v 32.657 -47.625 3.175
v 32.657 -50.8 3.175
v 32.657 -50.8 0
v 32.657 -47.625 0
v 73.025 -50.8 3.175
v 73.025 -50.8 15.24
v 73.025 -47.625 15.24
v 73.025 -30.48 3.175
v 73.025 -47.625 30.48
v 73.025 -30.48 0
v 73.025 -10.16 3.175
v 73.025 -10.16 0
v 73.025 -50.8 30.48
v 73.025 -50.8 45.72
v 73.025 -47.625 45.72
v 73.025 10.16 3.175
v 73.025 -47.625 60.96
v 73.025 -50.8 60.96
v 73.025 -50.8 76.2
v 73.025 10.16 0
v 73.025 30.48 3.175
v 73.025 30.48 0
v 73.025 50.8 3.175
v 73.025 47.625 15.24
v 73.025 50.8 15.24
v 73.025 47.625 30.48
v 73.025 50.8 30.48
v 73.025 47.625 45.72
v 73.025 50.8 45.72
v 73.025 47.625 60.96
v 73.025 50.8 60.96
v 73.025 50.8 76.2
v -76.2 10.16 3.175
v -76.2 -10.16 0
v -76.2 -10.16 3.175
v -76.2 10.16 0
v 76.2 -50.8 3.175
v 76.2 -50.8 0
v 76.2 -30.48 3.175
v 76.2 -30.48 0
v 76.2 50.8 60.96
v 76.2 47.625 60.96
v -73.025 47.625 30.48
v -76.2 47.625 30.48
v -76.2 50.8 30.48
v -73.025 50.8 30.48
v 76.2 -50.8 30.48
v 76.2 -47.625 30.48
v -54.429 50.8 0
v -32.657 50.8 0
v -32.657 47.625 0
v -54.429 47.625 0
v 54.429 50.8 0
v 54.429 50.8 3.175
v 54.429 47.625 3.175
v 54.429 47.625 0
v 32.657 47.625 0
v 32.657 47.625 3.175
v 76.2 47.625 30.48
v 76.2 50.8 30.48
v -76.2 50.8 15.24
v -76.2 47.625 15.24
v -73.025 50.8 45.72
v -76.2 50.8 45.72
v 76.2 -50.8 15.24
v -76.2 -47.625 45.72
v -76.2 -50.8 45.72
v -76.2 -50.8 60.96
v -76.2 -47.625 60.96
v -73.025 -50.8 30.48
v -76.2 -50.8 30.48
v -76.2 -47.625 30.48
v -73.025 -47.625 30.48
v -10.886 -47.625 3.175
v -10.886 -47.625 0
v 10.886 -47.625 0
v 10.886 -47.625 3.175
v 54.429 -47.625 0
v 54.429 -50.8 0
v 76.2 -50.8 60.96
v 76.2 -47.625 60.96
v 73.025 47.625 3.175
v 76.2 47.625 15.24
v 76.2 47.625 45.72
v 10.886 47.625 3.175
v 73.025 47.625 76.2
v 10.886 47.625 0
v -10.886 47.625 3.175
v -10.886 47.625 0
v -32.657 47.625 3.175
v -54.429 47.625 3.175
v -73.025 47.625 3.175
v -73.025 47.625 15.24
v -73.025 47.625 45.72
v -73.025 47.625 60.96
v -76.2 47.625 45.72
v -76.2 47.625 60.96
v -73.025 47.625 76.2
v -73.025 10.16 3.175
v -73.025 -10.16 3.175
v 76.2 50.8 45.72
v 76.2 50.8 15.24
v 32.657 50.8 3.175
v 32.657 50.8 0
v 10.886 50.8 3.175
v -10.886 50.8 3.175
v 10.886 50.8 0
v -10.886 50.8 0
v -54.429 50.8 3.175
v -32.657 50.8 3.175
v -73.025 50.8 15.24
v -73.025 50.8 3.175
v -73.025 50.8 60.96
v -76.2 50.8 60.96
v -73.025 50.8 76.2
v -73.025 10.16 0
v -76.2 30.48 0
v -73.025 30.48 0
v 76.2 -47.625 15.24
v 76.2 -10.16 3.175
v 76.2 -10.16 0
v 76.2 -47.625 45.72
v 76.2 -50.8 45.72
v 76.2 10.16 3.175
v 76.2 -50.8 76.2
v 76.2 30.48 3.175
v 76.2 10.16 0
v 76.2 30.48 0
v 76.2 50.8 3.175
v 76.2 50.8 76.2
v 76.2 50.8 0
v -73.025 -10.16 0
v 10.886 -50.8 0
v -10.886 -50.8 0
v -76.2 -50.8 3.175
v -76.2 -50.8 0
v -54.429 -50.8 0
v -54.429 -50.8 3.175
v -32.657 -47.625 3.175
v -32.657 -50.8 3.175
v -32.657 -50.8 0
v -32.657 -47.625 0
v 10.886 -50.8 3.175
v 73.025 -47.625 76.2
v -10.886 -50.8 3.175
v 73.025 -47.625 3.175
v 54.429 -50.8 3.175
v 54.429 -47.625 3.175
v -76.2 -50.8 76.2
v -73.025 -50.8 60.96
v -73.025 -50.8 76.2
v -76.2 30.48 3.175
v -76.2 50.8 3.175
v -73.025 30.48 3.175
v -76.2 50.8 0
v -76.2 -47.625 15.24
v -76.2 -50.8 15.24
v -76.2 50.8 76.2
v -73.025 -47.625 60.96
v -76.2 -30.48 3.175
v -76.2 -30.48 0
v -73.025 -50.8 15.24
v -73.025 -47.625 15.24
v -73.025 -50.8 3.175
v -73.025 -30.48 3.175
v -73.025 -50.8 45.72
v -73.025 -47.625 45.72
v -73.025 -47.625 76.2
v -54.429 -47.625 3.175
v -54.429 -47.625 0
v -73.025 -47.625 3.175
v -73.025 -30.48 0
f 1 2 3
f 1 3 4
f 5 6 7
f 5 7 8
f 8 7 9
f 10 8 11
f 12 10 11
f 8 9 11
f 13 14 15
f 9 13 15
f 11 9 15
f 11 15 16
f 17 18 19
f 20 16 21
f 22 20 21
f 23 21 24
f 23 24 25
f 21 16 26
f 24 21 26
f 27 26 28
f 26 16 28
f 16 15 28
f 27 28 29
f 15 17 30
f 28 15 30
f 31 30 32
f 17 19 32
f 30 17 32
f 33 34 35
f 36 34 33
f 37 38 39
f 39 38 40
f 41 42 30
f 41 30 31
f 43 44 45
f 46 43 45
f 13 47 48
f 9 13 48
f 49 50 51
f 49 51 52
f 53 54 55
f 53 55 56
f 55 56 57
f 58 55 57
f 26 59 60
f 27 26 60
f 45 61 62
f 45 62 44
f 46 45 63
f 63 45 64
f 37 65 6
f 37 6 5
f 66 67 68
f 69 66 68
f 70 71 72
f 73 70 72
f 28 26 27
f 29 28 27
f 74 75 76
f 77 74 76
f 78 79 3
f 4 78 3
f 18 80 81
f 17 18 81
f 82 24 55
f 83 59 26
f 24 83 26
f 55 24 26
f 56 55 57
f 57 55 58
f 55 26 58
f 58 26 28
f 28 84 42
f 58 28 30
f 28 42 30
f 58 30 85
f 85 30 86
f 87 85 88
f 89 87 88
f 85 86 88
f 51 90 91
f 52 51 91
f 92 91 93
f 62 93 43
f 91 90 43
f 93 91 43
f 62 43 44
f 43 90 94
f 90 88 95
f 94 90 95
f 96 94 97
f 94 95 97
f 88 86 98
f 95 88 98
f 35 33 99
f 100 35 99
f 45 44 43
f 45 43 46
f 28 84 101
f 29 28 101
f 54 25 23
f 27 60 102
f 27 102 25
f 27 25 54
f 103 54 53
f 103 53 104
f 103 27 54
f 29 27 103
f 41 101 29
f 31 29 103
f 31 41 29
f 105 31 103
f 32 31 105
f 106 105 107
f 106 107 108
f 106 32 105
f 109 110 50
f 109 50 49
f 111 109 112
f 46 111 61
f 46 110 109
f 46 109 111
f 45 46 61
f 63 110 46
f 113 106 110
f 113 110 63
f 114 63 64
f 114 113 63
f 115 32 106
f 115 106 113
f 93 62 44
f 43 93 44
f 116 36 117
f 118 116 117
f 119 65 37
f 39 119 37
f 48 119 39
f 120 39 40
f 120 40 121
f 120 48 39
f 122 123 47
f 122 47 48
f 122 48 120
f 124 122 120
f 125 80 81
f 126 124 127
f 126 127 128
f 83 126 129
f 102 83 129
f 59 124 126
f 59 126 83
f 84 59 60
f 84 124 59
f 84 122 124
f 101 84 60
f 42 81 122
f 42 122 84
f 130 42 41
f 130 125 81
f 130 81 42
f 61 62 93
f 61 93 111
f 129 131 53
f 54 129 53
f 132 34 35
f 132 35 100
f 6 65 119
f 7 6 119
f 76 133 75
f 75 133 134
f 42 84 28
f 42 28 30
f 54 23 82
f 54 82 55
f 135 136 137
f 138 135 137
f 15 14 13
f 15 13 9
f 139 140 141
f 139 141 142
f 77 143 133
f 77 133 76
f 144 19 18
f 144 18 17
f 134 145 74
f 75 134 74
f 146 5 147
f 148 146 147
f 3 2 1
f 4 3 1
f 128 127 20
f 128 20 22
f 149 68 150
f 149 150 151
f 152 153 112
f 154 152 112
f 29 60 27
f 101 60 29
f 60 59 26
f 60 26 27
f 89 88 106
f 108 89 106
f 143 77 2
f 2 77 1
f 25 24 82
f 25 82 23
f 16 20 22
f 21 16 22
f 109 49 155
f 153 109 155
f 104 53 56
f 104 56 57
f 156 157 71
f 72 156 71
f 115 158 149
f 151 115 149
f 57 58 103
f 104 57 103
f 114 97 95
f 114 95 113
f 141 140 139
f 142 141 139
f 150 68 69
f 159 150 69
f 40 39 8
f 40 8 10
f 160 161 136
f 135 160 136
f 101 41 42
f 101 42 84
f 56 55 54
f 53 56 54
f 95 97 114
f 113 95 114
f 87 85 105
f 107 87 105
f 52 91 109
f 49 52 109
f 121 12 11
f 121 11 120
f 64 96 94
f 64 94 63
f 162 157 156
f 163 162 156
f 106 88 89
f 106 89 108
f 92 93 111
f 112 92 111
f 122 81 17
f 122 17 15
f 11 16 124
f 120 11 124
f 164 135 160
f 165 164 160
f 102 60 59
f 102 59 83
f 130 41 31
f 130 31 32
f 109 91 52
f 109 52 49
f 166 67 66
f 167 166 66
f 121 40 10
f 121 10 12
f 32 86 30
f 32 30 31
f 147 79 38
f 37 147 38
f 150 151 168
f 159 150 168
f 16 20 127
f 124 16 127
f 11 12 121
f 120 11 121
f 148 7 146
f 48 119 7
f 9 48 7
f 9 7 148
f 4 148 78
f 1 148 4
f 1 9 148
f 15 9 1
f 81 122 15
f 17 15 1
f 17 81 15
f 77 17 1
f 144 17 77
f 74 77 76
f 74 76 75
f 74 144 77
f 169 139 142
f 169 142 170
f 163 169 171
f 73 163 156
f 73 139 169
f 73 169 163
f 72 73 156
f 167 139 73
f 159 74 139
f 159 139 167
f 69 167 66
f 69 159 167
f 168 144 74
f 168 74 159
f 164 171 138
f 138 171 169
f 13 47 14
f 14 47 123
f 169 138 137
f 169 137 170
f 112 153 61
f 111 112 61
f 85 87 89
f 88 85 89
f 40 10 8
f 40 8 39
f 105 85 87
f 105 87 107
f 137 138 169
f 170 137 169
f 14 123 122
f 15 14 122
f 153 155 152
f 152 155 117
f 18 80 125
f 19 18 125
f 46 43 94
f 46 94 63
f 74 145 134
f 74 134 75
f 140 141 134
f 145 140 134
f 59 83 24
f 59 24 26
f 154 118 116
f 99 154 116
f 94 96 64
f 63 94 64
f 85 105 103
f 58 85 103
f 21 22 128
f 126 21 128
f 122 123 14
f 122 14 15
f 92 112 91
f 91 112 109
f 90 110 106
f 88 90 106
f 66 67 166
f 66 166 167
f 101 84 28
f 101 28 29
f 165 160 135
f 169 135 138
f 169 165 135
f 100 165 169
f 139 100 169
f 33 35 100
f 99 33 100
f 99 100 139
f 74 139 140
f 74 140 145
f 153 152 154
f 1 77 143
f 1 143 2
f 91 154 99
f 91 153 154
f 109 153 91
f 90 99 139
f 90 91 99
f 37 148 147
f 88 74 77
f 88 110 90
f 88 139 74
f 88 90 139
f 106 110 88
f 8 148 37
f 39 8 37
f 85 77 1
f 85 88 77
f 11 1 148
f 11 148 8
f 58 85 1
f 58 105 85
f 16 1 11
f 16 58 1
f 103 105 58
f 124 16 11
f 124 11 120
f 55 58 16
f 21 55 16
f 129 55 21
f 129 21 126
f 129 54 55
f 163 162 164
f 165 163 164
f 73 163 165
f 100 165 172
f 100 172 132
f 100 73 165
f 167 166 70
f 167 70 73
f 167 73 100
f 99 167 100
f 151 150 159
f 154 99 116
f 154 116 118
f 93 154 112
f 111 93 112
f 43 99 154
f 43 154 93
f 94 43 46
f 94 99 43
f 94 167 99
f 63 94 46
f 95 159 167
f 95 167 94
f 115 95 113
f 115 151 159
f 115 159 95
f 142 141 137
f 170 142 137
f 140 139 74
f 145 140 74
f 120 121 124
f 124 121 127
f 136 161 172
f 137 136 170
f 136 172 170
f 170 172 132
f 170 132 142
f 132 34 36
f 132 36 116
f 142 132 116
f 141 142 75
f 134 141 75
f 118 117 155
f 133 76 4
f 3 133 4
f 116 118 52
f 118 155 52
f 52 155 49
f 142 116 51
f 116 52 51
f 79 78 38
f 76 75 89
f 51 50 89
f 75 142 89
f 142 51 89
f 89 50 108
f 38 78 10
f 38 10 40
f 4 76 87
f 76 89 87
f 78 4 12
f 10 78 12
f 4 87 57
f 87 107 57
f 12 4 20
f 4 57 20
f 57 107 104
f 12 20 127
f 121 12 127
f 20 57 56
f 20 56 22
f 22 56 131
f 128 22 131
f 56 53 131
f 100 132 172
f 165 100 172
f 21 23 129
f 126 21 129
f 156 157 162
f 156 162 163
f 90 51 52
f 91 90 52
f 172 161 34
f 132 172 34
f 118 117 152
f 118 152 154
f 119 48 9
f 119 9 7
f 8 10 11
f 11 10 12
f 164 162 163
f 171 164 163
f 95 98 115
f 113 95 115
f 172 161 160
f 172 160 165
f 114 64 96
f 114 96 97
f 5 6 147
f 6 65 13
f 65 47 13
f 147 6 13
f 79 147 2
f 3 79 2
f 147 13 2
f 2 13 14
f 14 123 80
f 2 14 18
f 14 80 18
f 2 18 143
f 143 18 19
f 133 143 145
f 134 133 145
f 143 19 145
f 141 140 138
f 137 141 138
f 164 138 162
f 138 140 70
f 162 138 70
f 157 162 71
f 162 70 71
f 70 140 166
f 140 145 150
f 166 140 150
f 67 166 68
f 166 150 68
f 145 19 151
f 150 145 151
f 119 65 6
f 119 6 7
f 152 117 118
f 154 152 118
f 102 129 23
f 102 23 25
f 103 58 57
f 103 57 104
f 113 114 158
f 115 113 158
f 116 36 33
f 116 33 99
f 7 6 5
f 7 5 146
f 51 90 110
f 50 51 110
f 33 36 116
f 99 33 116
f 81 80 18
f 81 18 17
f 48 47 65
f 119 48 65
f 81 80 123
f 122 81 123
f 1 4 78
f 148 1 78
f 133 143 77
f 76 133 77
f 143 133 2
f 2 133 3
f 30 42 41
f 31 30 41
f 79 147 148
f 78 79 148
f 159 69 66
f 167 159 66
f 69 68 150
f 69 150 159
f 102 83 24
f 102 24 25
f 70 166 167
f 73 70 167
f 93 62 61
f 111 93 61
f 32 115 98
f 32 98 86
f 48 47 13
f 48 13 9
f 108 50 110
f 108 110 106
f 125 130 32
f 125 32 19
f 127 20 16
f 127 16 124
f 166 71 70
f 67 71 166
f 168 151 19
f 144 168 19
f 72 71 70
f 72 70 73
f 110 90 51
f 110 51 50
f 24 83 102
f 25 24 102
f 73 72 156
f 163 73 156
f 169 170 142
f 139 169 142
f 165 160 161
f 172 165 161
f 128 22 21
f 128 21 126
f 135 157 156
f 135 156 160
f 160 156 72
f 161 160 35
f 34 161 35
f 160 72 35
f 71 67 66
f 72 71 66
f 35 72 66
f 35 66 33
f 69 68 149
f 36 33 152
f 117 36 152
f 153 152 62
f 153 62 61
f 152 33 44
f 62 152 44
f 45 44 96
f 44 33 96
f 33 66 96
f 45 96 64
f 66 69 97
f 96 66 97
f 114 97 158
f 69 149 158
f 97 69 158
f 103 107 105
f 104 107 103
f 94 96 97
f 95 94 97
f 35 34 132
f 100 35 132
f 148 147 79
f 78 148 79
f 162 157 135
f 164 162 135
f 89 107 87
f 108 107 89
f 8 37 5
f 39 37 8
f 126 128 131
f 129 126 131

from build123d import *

# Parameters (mm, degrees)
F0_W     = 3.175
F0_H     = 3.175
F0_W_2   = 18.5964285714
F0_H_2   = 17.145
F0_H_3   = 20.32
F0_W_3   = 21.7714285714
F1_DEPTH = 3.175
F2_W     = 3.175
F2_H     = 15.24
F2_H_2   = 12.065
F2_H_3   = 3.175
F3_DEPTH = 3.175
F7_DEPTH = 3.175


with BuildPart() as f1:
    # F0 (on Top) → F1 (new body)
    with BuildSketch(Plane.XY):
        with Locations((-74.6125, 49.2125)):
            Rectangle(F0_W, F0_H)
        with Locations((-63.7267857143, 49.2125)):
            Rectangle(F0_W_2, F0_H)
        with Locations((-74.6125, 39.0525)):
            Rectangle(F0_W, F0_H_2)
        Polygon((73.025, 30.48), (73.025, 47.625), (54.4285714286, 47.625), (32.6571428571, 47.625), (10.8857142857, 47.625), (-10.8857142857, 47.625), (-32.6571428571, 47.625), (-54.4285714286, 47.625), (-73.025, 47.625), (-73.025, 30.48), (-73.025, 10.16), (-73.025, -10.16), (-73.025, -30.48), (-73.025, -47.625), (-54.4285714286, -47.625), (-32.6571428571, -47.625), (-10.8857142857, -47.625), (10.8857142857, -47.625), (32.6571428571, -47.625), (54.4285714286, -47.625), (73.025, -47.625), (73.025, -30.48), (73.025, -10.16), (73.025, 10.16), align=None)
        with Locations((-74.6125, 0)):
            Rectangle(F0_W, F0_H_3)
        with Locations((-74.6125, -39.0525)):
            Rectangle(F0_W, F0_H_2)
        with Locations((-74.6125, -49.2125)):
            Rectangle(F0_W, F0_H)
        with Locations((-63.7267857143, -49.2125)):
            Rectangle(F0_W_2, F0_H)
        with Locations((-21.7714285714, -49.2125)):
            Rectangle(F0_W_3, F0_H)
        with Locations((21.7714285714, -49.2125)):
            Rectangle(F0_W_3, F0_H)
        with Locations((63.7267857143, -49.2125)):
            Rectangle(F0_W_2, F0_H)
        with Locations((74.6125, -49.2125)):
            Rectangle(F0_W, F0_H)
        with Locations((74.6125, -39.0525)):
            Rectangle(F0_W, F0_H_2)
        with Locations((74.6125, 0)):
            Rectangle(F0_W, F0_H_3)
        with Locations((74.6125, 39.0525)):
            Rectangle(F0_W, F0_H_2)
        with Locations((74.6125, 49.2125)):
            Rectangle(F0_W, F0_H)
        with Locations((63.7267857143, 49.2125)):
            Rectangle(F0_W_2, F0_H)
        with Locations((21.7714285714, 49.2125)):
            Rectangle(F0_W_3, F0_H)
        with Locations((-21.7714285714, 49.2125)):
            Rectangle(F0_W_3, F0_H)
    extrude(amount=F1_DEPTH)


with BuildPart() as f3:
    # F2 (on face) → F3 (new body)
    with BuildSketch(Plane.YZ.offset(76.2)):
        with Locations((-49.2125, 68.58)):
            Rectangle(F2_W, F2_H)
        Polygon((-30.48, 3.175), (-30.48, 0), (47.625, 0), (47.625, 15.24), (47.625, 30.48), (47.625, 45.72), (47.625, 60.96), (47.625, 76.2), (-47.625, 76.2), (-47.625, 60.96), (-47.625, 45.72), (-47.625, 30.48), (-47.625, 15.24), (-47.625, 3.175), align=None)
        with Locations((-49.2125, 38.1)):
            Rectangle(F2_W, F2_H)
        with Locations((-49.2125, 9.2075)):
            Rectangle(F2_W, F2_H_2)
        with Locations((-49.2125, 1.5875)):
            Rectangle(F2_W, F2_H_3)
        with Locations((49.2125, 7.62)):
            Rectangle(F2_W, F2_H)
        with Locations((49.2125, 38.1)):
            Rectangle(F2_W, F2_H)
        with Locations((49.2125, 68.58)):
            Rectangle(F2_W, F2_H)
    extrude(amount=-F3_DEPTH)


with BuildPart() as f4_1:
    # F4: instance of F3
    add(f3.part.mirror(Plane.YZ))

    # F5: cut F1
    add(f1.part, mode=Mode.SUBTRACT)


with BuildPart() as f3_1:
    add(f3.part)

    # F5: cut F1
    add(f1.part, mode=Mode.SUBTRACT)


with BuildPart() as f7:
    # F6 (on face) → F7 (new body)
    with BuildSketch(Plane(origin=(0, 50.8, 0), x_dir=(-1, 0, 0), z_dir=(0, 1, 0))):
        Polygon((-54.4285714286, 3.175), (-54.4285714286, 0), (76.2, 0), (76.2, 76.2), (-76.2, 76.2), (-76.2, 3.175), align=None)
    extrude(amount=-F7_DEPTH)


with BuildPart() as f8_1:
    # F8: instance of F7
    add(f7.part.mirror(Plane.XZ))

    # F9: cut F3, F4_1, F1
    add(f3_1.part, mode=Mode.SUBTRACT)
    add(f4_1.part, mode=Mode.SUBTRACT)
    add(f1.part, mode=Mode.SUBTRACT)


with BuildPart() as f7_1:
    add(f7.part)

    # F9: cut F3, F4_1, F1
    add(f3_1.part, mode=Mode.SUBTRACT)
    add(f4_1.part, mode=Mode.SUBTRACT)
    add(f1.part, mode=Mode.SUBTRACT)


solid = Compound([f1.part, f4_1.part, f3_1.part, f8_1.part, f7_1.part])
